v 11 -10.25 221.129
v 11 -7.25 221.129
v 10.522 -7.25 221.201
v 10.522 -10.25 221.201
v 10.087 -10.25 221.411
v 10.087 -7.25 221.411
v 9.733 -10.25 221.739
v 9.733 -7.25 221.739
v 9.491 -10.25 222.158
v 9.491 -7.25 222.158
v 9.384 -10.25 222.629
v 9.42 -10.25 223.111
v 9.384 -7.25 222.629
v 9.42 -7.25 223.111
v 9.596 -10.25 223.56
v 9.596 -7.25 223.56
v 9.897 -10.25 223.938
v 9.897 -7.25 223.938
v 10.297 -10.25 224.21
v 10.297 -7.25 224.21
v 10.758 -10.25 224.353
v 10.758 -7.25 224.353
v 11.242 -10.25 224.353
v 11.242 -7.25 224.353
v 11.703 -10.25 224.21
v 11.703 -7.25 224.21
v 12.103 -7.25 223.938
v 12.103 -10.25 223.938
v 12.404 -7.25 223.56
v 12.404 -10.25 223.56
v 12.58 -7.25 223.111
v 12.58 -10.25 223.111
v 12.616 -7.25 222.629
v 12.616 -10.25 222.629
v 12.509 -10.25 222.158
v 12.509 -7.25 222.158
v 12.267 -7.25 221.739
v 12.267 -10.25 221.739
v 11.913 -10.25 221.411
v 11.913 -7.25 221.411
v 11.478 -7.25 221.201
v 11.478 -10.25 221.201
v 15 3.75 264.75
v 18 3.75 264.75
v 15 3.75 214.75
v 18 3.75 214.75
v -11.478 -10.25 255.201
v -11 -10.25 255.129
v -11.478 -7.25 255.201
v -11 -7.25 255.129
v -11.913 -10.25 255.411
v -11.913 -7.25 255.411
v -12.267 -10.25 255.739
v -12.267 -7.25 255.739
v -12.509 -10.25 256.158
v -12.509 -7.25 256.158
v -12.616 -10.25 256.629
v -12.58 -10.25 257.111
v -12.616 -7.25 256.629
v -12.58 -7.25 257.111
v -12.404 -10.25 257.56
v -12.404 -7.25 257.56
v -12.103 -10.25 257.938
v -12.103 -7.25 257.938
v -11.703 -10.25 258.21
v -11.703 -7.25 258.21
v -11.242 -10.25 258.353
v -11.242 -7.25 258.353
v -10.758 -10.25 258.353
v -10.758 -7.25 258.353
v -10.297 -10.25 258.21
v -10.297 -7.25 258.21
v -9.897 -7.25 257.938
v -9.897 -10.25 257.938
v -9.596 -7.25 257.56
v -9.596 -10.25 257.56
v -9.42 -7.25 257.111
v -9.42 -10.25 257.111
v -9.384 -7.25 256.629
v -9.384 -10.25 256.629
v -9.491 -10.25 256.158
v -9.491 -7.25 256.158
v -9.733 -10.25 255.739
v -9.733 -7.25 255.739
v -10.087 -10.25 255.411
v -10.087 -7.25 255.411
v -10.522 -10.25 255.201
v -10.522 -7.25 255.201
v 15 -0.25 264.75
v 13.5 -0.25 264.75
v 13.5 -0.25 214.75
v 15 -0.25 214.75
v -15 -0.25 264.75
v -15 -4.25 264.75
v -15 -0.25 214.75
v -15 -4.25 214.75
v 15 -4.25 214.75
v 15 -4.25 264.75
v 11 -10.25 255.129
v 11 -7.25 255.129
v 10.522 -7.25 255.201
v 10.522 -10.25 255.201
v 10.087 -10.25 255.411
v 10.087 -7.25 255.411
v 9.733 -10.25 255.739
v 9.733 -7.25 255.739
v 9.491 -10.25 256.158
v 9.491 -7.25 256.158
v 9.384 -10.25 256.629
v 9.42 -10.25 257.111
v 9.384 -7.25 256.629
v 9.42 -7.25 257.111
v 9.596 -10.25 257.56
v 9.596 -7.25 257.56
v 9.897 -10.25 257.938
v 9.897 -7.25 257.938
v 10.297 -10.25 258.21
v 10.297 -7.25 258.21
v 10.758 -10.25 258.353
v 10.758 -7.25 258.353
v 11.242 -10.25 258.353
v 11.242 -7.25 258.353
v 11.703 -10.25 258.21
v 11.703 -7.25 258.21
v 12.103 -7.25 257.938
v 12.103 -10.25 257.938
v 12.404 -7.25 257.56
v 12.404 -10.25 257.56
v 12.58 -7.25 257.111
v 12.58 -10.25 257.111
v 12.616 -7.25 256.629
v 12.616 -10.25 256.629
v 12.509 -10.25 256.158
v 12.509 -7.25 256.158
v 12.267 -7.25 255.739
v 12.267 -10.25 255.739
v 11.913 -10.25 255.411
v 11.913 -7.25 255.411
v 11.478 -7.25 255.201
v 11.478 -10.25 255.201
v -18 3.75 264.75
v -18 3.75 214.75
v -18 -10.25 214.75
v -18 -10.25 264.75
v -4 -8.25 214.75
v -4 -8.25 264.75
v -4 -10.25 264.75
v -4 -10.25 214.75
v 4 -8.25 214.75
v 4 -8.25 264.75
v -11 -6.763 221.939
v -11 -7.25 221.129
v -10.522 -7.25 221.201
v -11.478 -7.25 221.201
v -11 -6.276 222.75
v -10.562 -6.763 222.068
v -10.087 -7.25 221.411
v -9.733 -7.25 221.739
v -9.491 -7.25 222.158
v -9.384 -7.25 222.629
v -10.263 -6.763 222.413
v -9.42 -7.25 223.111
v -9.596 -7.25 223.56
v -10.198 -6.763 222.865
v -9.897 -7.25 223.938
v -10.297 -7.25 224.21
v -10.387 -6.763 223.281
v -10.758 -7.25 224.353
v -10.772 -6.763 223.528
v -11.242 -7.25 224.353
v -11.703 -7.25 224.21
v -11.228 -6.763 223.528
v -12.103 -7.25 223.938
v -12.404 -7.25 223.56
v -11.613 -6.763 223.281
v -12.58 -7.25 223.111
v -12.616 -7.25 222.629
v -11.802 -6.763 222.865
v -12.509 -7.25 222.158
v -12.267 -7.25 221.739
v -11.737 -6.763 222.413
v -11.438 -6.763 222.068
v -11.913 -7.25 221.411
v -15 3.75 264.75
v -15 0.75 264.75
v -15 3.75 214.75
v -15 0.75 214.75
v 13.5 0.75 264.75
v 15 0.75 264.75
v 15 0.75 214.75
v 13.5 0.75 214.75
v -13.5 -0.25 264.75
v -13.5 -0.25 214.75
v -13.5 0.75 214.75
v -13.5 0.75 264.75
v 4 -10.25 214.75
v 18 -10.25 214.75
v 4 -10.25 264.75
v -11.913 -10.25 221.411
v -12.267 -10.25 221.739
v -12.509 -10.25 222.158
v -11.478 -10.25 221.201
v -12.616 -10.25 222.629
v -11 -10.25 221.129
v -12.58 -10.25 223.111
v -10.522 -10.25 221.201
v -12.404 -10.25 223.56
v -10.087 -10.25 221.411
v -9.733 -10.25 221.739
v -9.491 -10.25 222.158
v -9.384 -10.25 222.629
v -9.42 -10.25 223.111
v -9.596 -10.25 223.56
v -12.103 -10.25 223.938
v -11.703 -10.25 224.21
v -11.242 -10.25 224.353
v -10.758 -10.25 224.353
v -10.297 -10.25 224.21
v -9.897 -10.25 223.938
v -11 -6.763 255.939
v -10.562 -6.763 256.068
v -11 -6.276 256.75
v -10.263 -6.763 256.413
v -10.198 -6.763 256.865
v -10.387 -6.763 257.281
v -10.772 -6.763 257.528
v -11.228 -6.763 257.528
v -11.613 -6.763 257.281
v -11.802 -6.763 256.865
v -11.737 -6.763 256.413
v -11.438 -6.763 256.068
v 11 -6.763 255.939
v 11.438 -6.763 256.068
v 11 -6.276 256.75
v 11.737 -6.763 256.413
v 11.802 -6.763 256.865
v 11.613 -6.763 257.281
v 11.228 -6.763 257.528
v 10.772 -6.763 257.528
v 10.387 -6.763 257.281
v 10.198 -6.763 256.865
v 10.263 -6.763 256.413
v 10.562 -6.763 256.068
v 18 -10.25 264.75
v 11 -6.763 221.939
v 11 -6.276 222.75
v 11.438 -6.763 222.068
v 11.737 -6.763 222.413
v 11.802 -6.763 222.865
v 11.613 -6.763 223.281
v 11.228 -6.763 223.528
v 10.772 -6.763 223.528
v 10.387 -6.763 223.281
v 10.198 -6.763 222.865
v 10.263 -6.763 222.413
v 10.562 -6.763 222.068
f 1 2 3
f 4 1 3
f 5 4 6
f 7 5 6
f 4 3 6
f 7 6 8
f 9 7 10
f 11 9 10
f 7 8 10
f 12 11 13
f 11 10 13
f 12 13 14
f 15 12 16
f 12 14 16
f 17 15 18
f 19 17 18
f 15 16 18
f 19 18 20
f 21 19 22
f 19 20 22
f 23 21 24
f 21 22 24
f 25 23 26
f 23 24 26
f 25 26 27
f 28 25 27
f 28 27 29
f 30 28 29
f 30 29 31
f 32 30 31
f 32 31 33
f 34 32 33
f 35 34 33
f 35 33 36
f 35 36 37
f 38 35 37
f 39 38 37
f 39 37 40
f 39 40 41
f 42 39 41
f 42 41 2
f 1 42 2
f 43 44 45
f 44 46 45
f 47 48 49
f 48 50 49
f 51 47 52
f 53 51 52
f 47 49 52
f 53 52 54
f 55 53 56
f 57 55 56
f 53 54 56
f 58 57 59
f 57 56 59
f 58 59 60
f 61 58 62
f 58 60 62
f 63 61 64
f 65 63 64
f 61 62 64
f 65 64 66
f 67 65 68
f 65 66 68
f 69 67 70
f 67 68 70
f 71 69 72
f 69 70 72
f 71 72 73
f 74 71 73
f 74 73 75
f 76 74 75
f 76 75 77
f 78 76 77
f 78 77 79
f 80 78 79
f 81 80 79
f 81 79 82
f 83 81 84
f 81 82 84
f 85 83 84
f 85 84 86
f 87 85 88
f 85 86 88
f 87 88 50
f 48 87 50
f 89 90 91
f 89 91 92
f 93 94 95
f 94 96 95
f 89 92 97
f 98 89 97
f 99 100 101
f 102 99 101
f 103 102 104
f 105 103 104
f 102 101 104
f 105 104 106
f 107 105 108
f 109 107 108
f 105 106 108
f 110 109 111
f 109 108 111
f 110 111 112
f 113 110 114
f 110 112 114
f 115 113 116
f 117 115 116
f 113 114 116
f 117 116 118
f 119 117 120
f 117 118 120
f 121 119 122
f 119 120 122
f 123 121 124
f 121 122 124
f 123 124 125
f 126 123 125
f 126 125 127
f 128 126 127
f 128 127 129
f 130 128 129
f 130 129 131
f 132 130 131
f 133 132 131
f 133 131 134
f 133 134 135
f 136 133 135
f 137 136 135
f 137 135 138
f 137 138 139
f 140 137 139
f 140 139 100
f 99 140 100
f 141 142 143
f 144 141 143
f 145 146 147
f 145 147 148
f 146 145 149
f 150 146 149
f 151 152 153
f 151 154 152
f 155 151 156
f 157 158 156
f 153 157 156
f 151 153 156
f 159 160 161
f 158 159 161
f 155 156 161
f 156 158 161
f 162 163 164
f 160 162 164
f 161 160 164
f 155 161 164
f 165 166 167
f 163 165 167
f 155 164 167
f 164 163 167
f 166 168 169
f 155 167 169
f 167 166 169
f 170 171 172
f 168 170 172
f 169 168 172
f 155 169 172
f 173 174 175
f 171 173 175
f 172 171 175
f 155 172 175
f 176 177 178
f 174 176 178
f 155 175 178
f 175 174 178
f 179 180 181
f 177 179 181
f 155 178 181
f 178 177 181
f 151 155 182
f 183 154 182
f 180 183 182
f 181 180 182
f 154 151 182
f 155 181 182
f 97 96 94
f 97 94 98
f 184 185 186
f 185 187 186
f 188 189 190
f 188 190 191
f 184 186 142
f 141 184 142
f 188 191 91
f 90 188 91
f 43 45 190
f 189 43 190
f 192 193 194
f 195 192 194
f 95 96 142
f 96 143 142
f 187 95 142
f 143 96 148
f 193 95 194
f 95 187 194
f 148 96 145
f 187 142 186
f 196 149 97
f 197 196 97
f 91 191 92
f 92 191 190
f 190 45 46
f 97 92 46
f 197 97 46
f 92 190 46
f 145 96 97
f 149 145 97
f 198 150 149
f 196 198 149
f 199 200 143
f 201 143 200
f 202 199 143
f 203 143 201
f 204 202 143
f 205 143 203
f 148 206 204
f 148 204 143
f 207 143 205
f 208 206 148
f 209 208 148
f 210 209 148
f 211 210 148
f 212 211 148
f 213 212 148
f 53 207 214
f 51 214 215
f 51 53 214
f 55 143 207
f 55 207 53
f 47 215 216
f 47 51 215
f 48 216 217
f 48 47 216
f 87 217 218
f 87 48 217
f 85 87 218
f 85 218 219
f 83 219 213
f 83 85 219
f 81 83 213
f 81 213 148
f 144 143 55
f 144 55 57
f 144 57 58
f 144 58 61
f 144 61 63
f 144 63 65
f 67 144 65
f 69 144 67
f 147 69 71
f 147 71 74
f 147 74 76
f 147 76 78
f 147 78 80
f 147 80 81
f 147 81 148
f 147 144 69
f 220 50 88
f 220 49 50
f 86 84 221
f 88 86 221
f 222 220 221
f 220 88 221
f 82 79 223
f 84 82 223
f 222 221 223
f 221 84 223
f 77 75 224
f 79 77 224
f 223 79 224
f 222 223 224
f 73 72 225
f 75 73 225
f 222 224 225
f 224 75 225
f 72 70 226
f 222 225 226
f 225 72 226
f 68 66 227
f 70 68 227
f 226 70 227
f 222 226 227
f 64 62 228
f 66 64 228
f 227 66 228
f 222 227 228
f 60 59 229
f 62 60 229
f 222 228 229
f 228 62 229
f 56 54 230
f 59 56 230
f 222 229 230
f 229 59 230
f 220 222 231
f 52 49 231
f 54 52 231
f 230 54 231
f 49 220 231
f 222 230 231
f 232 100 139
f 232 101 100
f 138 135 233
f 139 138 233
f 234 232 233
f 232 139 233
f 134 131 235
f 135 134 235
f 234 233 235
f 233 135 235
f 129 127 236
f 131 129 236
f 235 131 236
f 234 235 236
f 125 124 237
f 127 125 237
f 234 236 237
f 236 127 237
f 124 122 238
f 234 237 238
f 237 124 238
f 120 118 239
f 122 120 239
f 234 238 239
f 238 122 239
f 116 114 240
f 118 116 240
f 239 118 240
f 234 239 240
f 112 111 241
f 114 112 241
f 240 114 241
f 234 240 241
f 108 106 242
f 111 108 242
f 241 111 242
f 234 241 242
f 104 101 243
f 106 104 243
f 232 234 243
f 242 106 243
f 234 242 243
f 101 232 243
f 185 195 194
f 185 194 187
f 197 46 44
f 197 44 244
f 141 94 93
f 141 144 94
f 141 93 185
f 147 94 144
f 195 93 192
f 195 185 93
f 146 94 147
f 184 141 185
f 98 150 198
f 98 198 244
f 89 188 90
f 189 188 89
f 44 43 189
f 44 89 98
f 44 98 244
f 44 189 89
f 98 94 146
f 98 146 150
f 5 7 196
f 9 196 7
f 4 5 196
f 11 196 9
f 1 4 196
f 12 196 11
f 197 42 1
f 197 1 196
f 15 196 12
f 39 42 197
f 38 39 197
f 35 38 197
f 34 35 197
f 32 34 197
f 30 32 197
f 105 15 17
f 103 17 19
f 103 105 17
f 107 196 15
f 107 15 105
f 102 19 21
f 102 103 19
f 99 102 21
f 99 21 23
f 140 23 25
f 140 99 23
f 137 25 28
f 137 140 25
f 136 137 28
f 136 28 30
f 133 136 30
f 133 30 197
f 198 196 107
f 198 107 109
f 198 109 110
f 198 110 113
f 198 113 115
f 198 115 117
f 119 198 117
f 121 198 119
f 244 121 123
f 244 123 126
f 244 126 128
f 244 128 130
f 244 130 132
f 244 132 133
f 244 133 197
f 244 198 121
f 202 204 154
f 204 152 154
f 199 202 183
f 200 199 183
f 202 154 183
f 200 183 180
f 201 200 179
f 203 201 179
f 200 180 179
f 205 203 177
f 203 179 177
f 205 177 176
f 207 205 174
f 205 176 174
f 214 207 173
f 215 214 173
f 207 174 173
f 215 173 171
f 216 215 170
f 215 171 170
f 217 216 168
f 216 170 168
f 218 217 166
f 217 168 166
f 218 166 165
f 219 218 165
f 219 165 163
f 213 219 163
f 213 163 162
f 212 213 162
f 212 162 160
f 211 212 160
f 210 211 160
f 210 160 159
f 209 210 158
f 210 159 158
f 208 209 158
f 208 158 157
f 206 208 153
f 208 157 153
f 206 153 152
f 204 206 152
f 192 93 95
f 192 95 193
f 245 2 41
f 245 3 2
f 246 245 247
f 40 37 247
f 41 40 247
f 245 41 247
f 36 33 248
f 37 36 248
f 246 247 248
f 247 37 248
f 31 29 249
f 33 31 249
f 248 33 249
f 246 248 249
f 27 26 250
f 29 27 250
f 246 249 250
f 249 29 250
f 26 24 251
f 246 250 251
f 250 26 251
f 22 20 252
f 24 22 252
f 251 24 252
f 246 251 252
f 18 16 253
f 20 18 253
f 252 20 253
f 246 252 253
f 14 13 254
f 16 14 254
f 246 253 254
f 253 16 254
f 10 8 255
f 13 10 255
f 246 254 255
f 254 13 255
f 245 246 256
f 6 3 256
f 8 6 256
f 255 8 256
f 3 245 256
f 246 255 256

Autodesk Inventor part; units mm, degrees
ref_plane "YZ Plane" through (0, 0, 0) normal (1, 0, 0) x (0, 1, 0)
ref_plane "XZ Plane" through (0, 0, 0) normal (0, 1, 0) x (-1, 0, 0)
ref_plane "XY Plane" through (0, 0, 0) normal (0, 0, 1) x (1, 0, 0)
ref_plane "工作平面1" through (0, 0, 214.75) normal (0, 0, 1) x (1, 0, 0)
sketch "草图2" plane through (0, 0, 214.75) normal (0, 0, 1) x (1, 0, 0)
  line L0 (15, -0.25) -> (15, -3.75) projected
  line L1 (15, 3.75) -> (15, 0.75) projected
  line L2 (15, 0.75) -> (13.5, 0.75) projected
  line L3 (13.5, 0.75) -> (13.5, -0.25) projected
  line L4 (13.5, -0.25) -> (15, -0.25) projected
  line L5 (27.5, 3.75) -> (-27.5, 3.75) projected
  line L6 (-15, 0.75) -> (-15, 3.75) projected
  line L7 (-15, -3.75) -> (-15, -0.25) projected
  line L8 (-13.5, 0.75) -> (-15, 0.75) projected
  line L9 (-13.5, -0.25) -> (-13.5, 0.75) projected
  line L10 (-15, -0.25) -> (-13.5, -0.25) projected
  line L11 (-15, -4.25) -> (15, -4.25) projected
  line L12 (-15, -3.75) -> (-15, -4.25) projected
  line L13 (15, -4.25) -> (15, -3.75) projected
  line L14 (18, 3.75) -> (18, -8.25)
  line L15 (-18, 3.75) -> (-18, -8.25)
  line L16 (-18, -8.25) -> (18, -8.25)
  point P0 (0, 0)
  dimension "d0" = 12
  dimension "d1" = 3
  dimension "d2" = 12
  dimension "d3" = 3
extrude "拉伸1" add sketch "草图2" along normal blind 50 contours L4 L3 L2 L1 L5 L14 L16 L15 L6 L8 L9 L10 L7 L12 L11 L13 L0
sketch "草图3" plane through (-18, -8.25, 214.75) normal (0, -1, 0) x (1, 0, 0)
  line L0 (0, 0) -> (0, 50) projected
  line L1 (0, 0) -> (36, 0) projected
  line L2 (0, 50) -> (14, 50)
  line L3 (14, 50) -> (14, 0)
  line L4 (14, 0) -> (0, 0)
  line L5 (0, 0) -> (0, 50)
  line L6 (0, 50) -> (36, 50) projected
  line L7 (36, 50) -> (22, 50)
  line L8 (22, 50) -> (22, 0)
  line L9 (22, 0) -> (36, 0)
  line L10 (36, 0) -> (36, 50)
  point P0 (18, -214.75)
  dimension "d6" = 14
  dimension "d7" = 14
extrude "拉伸2" add sketch "草图3" along normal blind 2 contours L0 L2 L3 L1 | L8 L6 L10 L1
sketch "草图4" plane through (-18, -10.25, 214.75) normal (0, -1, 0) x (1, 0, 0)
  line L0 (0, 50) -> (0, 0) projected
  line L1 (14, 50) -> (0, 50) projected
  line L2 (0, 0) -> (14, 0) projected
  line L3 (36, 50) -> (22, 50) projected
  line L4 (36, 0) -> (36, 50) projected
  line L5 (22, 0) -> (36, 0) projected
  point P0 (18, -214.75)
  point P1 (7, 42)
  point P2 (7, 8)
  point P3 (29, 42)
  point P4 (29, 8)
  dimension "d10" = 7
  dimension "d11" = 8
  dimension "d12" = 8
  dimension "d13" = 7
  dimension "d14" = 8
  dimension "d15" = 7
  dimension "d16" = 7
  dimension "d17" = 8
hole "孔1" at (-11, -10.25, 256.75) at (-11, -10.25, 222.75) at (11, -10.25, 256.75) at (11, -10.25, 222.75) direction (0, 1, 0) diameter 3.242 depth 3 tip angle 118 thread size "M4x0.7" designation "M4" class "6H" standard "GB Metric profile"
properties part number "滑块"
